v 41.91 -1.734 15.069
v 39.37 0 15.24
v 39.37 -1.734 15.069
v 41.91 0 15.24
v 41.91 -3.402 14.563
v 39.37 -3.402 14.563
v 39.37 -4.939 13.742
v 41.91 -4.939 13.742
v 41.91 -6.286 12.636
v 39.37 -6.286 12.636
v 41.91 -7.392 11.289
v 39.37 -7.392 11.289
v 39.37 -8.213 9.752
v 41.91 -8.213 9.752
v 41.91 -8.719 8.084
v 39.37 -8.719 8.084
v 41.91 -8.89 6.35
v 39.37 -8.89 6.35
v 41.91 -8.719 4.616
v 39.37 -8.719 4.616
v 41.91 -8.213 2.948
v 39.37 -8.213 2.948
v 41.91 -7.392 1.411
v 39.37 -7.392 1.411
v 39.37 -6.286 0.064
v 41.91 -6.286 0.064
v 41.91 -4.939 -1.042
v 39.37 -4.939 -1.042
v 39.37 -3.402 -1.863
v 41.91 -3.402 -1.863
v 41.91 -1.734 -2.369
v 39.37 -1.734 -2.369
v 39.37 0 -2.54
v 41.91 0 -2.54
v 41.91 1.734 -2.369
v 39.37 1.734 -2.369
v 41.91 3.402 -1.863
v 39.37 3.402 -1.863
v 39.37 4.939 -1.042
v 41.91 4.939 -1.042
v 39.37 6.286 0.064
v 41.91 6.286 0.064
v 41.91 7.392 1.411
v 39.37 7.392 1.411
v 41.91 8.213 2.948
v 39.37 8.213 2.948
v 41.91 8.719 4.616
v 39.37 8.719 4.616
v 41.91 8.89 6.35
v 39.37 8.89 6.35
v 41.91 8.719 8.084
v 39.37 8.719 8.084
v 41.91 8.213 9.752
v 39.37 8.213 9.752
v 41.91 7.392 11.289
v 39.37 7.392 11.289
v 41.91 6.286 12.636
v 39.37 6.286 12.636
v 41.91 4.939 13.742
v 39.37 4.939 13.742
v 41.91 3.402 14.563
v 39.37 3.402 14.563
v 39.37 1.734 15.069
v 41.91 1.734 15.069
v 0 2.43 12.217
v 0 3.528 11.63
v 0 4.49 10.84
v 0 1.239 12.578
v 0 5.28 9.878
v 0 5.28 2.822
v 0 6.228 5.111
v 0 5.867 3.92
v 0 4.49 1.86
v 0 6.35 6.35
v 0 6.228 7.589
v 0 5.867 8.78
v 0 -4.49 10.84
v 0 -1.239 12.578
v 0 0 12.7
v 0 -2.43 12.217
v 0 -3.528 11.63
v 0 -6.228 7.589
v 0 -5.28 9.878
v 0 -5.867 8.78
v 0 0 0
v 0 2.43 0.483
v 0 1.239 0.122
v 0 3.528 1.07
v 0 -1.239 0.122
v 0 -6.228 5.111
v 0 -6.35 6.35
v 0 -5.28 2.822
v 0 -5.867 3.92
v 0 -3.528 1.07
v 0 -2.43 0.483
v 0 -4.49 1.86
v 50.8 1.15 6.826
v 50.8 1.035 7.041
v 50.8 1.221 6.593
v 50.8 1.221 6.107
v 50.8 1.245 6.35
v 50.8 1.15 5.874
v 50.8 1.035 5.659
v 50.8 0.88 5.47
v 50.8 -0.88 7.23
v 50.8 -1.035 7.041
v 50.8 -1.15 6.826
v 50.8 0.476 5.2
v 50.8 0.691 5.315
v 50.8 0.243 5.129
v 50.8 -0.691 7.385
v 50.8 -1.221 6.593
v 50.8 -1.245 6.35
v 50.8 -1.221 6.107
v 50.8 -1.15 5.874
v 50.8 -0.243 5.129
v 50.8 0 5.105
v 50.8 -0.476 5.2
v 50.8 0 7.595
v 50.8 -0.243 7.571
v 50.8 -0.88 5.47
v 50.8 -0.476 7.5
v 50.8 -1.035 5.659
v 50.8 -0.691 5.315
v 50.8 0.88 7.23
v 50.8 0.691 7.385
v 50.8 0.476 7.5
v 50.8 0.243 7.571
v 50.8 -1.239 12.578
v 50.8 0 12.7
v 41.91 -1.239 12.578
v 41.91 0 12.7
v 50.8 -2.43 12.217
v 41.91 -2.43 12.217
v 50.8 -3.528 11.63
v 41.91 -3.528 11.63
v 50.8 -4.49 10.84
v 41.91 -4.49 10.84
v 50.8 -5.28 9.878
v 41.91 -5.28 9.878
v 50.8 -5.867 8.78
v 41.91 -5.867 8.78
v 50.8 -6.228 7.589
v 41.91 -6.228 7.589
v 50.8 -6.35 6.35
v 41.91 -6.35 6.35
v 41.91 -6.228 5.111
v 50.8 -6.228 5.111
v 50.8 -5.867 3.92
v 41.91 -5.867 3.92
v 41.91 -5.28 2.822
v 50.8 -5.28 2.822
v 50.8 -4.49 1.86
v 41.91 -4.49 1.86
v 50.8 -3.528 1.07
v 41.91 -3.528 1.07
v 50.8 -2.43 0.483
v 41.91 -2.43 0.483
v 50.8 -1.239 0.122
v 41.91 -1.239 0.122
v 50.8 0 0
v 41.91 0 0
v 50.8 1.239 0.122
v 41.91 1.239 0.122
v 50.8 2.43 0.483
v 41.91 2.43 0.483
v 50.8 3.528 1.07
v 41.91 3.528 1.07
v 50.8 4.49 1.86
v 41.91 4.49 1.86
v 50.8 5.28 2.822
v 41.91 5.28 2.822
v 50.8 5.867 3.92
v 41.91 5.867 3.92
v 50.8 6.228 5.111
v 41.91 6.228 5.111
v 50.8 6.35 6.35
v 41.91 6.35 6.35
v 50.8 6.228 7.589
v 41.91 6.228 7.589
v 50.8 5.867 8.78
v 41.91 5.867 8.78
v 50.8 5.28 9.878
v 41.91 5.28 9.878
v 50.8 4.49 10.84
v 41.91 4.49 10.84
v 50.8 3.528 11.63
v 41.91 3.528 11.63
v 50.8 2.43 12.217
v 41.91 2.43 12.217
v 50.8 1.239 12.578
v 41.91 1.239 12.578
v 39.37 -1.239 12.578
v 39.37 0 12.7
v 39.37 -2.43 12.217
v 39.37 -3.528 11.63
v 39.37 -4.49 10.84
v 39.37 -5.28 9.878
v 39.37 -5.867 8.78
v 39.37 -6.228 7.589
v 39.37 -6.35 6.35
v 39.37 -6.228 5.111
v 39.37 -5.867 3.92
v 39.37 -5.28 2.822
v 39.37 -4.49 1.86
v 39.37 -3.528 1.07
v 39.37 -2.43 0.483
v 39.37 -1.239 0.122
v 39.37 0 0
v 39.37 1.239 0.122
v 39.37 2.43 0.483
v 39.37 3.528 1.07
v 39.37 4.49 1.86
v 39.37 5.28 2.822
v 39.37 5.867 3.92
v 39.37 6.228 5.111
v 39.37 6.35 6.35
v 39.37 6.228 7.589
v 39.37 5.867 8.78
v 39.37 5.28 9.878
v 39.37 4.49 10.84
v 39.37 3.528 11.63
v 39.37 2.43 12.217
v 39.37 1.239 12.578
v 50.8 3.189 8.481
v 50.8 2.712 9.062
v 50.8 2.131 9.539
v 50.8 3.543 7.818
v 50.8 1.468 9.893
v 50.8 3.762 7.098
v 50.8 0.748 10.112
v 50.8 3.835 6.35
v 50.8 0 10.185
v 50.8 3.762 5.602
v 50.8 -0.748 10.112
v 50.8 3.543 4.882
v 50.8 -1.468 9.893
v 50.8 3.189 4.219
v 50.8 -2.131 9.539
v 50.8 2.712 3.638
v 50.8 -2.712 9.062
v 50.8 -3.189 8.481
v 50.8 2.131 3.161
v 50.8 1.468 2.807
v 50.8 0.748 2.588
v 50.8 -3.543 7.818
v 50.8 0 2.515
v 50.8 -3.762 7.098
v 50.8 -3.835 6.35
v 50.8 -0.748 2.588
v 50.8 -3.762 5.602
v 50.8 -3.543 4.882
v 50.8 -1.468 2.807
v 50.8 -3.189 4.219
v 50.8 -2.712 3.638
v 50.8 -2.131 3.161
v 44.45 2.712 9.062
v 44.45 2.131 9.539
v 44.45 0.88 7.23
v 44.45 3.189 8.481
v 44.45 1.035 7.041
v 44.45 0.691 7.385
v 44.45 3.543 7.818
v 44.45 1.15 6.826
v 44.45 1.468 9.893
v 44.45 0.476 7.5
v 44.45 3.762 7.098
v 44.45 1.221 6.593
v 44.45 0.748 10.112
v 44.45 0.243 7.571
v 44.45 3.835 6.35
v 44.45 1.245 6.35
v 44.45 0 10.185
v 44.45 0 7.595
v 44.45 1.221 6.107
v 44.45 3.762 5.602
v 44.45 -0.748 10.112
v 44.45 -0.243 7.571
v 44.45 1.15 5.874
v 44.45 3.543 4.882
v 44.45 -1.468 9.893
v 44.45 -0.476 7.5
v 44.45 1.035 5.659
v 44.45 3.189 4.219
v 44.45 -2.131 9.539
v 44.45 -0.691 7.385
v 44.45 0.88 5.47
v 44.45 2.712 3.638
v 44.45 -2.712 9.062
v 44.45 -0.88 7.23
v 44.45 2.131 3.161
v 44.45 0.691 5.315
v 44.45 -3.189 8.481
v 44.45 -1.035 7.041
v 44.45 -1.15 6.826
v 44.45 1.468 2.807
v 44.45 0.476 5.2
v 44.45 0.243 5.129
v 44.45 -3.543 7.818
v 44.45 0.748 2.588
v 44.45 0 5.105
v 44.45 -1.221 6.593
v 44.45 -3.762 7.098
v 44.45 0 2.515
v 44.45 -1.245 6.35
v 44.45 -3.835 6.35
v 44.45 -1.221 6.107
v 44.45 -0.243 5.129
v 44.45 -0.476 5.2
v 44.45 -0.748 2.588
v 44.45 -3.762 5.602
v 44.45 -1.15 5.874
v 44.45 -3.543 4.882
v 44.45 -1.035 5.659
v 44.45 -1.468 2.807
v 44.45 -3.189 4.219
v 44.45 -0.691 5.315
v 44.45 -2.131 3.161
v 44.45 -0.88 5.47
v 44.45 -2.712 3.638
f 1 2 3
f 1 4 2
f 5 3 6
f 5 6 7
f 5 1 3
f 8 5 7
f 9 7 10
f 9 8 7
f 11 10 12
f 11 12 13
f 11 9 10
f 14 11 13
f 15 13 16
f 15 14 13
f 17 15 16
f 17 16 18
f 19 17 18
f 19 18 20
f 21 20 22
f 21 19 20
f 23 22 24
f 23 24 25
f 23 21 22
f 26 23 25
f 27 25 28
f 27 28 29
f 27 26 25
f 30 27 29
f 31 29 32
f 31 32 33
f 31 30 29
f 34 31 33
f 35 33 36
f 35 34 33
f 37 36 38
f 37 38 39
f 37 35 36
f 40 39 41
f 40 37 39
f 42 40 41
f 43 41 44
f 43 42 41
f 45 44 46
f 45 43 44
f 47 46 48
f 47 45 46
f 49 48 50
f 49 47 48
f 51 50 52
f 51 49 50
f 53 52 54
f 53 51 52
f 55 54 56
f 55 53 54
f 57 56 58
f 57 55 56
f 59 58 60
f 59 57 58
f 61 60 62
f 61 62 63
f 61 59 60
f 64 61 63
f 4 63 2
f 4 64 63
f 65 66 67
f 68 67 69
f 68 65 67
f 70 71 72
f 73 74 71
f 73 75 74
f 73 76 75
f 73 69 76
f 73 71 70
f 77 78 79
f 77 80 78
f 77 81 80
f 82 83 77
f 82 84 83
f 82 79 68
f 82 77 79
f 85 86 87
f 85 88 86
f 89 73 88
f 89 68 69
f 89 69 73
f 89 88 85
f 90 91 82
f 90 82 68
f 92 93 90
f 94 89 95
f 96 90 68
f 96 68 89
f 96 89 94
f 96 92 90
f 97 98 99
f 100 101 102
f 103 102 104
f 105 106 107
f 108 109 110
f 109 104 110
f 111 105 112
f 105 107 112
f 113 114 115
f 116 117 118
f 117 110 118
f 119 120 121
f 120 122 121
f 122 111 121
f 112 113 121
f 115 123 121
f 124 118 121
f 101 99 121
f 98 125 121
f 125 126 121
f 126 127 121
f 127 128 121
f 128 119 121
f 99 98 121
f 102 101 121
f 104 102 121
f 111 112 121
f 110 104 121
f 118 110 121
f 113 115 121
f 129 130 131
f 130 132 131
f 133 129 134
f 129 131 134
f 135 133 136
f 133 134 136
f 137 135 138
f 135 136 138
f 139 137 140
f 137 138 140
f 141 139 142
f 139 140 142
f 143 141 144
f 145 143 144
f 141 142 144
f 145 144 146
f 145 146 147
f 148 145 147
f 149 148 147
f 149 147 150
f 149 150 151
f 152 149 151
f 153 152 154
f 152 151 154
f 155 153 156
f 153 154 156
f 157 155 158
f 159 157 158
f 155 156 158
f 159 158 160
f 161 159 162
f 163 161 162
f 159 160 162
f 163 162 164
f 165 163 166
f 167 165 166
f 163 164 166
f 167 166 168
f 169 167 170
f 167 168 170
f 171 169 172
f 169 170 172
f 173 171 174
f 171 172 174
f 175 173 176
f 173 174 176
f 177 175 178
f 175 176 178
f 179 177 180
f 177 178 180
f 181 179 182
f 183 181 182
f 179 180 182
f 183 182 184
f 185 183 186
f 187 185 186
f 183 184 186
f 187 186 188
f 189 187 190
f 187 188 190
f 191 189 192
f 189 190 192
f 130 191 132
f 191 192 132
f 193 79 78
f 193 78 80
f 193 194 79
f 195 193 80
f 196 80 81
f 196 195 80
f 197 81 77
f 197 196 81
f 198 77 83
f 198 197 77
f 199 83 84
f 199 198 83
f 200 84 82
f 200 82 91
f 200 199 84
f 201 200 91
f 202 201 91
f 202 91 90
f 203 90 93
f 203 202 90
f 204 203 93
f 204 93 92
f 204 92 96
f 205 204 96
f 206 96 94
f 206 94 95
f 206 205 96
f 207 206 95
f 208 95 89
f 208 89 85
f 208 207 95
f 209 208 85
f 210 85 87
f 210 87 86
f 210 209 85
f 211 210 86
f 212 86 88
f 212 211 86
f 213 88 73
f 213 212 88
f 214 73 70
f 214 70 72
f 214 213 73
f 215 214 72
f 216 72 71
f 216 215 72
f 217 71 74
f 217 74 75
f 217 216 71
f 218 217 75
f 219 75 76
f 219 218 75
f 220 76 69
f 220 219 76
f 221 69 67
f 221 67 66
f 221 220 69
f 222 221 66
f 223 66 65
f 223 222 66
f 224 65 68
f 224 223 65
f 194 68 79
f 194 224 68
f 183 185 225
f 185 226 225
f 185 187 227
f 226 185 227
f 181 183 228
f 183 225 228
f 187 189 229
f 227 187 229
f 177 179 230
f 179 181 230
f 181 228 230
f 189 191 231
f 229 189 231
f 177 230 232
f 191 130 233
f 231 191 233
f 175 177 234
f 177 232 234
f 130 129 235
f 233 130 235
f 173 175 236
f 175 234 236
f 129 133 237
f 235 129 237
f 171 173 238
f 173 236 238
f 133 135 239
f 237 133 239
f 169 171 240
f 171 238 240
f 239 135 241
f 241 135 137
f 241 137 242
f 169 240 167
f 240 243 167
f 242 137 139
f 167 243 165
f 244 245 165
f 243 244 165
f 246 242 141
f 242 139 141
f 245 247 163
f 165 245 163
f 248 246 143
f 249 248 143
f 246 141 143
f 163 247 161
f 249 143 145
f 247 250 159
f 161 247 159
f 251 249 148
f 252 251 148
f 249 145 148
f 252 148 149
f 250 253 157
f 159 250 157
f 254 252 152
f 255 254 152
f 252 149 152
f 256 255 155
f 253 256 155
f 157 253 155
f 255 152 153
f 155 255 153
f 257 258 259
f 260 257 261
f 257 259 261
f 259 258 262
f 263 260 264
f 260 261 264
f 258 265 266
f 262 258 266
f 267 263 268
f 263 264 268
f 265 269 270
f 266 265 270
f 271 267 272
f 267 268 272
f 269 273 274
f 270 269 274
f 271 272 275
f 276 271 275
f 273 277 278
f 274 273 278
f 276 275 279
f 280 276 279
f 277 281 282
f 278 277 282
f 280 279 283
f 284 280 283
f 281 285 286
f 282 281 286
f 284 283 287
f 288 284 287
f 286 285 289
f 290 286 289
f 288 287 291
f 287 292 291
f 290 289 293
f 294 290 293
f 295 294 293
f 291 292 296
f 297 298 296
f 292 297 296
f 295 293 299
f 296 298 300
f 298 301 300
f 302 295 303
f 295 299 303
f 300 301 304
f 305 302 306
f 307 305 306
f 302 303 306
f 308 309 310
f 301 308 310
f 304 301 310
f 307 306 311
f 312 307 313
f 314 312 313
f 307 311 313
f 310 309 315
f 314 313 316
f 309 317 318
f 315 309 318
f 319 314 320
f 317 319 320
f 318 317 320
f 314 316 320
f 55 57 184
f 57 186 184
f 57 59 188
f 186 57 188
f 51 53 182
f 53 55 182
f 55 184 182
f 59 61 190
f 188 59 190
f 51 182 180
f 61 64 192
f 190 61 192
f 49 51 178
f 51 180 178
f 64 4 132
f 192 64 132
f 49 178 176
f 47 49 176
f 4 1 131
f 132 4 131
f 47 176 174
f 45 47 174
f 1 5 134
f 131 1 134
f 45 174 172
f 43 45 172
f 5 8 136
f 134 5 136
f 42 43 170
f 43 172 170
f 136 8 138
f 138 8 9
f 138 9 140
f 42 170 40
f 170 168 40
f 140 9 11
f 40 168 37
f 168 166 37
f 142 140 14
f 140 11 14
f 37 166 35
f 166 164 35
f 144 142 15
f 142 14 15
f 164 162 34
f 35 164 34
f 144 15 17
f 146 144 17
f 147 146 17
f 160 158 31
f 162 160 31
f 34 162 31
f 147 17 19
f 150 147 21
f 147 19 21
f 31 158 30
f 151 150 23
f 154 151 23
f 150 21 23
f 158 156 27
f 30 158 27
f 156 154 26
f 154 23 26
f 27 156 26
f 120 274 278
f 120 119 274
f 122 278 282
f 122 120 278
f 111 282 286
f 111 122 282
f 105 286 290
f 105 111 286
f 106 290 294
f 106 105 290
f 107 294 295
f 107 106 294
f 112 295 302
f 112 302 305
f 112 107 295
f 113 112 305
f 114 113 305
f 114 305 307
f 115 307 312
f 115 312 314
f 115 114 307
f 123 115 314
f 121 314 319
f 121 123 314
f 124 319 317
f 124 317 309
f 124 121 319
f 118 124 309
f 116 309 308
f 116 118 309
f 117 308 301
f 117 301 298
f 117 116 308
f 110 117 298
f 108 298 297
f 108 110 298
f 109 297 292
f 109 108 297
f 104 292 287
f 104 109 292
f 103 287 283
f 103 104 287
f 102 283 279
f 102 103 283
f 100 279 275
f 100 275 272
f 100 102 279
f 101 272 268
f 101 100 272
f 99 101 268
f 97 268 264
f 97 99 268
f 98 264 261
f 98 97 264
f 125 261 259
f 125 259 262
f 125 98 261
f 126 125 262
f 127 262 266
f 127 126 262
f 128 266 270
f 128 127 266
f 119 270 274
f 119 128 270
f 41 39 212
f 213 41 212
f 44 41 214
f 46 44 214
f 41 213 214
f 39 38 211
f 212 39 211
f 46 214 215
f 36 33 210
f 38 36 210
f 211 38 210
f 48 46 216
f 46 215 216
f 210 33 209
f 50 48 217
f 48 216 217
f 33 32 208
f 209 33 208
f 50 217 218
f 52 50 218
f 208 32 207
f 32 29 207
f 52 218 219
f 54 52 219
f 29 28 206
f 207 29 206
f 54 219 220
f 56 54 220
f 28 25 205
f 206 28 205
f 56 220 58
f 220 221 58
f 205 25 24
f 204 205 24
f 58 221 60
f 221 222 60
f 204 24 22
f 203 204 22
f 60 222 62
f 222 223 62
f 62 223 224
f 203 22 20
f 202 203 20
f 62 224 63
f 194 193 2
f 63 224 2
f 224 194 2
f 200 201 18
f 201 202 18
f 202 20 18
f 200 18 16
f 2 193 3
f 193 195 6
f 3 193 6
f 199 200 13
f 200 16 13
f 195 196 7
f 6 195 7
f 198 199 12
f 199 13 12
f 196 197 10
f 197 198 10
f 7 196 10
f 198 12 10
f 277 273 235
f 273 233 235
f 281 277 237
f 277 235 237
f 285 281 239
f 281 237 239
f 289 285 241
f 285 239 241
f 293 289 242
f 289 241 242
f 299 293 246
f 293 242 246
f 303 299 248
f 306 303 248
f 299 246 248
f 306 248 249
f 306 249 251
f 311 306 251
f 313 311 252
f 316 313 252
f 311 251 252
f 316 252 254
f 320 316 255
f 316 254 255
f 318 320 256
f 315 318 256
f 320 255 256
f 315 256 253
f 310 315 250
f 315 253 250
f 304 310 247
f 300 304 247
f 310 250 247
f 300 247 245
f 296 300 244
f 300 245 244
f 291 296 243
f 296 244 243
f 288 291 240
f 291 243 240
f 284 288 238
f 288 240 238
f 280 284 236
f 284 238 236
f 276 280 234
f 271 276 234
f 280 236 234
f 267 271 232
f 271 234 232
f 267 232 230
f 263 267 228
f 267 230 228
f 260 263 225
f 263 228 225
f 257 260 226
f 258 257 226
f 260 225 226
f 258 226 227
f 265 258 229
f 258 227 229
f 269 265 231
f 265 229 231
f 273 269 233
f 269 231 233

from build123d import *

# Parameters (mm, degrees)
F0_W   = 2.54
F0_H   = 6.35
F0_H_2 = 2.54
F0_W_2 = 39.37
F0_W_3 = 6.35
F0_H_3 = 2.5146
F0_H_4 = 1.2446


# Not quite as in the source:
# - a feature names something its author has since deleted; it is built from what else it names


with BuildPart() as f1:
    # F0 (on Front) → F1 (revolve)
    with BuildSketch(Plane.XZ):
        Polygon((44.45, 12.7), (41.91, 12.7), (41.91, 6.35), (44.45, 6.35), (44.45, 7.5946), (44.45, 10.1854), align=None)
        with Locations((40.64, 9.525)):
            Rectangle(F0_W, F0_H)
        with Locations((40.64, 13.97)):
            Rectangle(F0_W, F0_H_2)
        with Locations((19.685, 9.525)):
            Rectangle(F0_W_2, F0_H)
        with Locations((47.625, 11.4427)):
            Rectangle(F0_W_3, F0_H_3)
        with Locations((47.625, 6.9723)):
            Rectangle(F0_W_3, F0_H_4)
    revolve(axis=Axis((19.685, 0, 6.35), (1, 0, 0)))


solid = f1.part
